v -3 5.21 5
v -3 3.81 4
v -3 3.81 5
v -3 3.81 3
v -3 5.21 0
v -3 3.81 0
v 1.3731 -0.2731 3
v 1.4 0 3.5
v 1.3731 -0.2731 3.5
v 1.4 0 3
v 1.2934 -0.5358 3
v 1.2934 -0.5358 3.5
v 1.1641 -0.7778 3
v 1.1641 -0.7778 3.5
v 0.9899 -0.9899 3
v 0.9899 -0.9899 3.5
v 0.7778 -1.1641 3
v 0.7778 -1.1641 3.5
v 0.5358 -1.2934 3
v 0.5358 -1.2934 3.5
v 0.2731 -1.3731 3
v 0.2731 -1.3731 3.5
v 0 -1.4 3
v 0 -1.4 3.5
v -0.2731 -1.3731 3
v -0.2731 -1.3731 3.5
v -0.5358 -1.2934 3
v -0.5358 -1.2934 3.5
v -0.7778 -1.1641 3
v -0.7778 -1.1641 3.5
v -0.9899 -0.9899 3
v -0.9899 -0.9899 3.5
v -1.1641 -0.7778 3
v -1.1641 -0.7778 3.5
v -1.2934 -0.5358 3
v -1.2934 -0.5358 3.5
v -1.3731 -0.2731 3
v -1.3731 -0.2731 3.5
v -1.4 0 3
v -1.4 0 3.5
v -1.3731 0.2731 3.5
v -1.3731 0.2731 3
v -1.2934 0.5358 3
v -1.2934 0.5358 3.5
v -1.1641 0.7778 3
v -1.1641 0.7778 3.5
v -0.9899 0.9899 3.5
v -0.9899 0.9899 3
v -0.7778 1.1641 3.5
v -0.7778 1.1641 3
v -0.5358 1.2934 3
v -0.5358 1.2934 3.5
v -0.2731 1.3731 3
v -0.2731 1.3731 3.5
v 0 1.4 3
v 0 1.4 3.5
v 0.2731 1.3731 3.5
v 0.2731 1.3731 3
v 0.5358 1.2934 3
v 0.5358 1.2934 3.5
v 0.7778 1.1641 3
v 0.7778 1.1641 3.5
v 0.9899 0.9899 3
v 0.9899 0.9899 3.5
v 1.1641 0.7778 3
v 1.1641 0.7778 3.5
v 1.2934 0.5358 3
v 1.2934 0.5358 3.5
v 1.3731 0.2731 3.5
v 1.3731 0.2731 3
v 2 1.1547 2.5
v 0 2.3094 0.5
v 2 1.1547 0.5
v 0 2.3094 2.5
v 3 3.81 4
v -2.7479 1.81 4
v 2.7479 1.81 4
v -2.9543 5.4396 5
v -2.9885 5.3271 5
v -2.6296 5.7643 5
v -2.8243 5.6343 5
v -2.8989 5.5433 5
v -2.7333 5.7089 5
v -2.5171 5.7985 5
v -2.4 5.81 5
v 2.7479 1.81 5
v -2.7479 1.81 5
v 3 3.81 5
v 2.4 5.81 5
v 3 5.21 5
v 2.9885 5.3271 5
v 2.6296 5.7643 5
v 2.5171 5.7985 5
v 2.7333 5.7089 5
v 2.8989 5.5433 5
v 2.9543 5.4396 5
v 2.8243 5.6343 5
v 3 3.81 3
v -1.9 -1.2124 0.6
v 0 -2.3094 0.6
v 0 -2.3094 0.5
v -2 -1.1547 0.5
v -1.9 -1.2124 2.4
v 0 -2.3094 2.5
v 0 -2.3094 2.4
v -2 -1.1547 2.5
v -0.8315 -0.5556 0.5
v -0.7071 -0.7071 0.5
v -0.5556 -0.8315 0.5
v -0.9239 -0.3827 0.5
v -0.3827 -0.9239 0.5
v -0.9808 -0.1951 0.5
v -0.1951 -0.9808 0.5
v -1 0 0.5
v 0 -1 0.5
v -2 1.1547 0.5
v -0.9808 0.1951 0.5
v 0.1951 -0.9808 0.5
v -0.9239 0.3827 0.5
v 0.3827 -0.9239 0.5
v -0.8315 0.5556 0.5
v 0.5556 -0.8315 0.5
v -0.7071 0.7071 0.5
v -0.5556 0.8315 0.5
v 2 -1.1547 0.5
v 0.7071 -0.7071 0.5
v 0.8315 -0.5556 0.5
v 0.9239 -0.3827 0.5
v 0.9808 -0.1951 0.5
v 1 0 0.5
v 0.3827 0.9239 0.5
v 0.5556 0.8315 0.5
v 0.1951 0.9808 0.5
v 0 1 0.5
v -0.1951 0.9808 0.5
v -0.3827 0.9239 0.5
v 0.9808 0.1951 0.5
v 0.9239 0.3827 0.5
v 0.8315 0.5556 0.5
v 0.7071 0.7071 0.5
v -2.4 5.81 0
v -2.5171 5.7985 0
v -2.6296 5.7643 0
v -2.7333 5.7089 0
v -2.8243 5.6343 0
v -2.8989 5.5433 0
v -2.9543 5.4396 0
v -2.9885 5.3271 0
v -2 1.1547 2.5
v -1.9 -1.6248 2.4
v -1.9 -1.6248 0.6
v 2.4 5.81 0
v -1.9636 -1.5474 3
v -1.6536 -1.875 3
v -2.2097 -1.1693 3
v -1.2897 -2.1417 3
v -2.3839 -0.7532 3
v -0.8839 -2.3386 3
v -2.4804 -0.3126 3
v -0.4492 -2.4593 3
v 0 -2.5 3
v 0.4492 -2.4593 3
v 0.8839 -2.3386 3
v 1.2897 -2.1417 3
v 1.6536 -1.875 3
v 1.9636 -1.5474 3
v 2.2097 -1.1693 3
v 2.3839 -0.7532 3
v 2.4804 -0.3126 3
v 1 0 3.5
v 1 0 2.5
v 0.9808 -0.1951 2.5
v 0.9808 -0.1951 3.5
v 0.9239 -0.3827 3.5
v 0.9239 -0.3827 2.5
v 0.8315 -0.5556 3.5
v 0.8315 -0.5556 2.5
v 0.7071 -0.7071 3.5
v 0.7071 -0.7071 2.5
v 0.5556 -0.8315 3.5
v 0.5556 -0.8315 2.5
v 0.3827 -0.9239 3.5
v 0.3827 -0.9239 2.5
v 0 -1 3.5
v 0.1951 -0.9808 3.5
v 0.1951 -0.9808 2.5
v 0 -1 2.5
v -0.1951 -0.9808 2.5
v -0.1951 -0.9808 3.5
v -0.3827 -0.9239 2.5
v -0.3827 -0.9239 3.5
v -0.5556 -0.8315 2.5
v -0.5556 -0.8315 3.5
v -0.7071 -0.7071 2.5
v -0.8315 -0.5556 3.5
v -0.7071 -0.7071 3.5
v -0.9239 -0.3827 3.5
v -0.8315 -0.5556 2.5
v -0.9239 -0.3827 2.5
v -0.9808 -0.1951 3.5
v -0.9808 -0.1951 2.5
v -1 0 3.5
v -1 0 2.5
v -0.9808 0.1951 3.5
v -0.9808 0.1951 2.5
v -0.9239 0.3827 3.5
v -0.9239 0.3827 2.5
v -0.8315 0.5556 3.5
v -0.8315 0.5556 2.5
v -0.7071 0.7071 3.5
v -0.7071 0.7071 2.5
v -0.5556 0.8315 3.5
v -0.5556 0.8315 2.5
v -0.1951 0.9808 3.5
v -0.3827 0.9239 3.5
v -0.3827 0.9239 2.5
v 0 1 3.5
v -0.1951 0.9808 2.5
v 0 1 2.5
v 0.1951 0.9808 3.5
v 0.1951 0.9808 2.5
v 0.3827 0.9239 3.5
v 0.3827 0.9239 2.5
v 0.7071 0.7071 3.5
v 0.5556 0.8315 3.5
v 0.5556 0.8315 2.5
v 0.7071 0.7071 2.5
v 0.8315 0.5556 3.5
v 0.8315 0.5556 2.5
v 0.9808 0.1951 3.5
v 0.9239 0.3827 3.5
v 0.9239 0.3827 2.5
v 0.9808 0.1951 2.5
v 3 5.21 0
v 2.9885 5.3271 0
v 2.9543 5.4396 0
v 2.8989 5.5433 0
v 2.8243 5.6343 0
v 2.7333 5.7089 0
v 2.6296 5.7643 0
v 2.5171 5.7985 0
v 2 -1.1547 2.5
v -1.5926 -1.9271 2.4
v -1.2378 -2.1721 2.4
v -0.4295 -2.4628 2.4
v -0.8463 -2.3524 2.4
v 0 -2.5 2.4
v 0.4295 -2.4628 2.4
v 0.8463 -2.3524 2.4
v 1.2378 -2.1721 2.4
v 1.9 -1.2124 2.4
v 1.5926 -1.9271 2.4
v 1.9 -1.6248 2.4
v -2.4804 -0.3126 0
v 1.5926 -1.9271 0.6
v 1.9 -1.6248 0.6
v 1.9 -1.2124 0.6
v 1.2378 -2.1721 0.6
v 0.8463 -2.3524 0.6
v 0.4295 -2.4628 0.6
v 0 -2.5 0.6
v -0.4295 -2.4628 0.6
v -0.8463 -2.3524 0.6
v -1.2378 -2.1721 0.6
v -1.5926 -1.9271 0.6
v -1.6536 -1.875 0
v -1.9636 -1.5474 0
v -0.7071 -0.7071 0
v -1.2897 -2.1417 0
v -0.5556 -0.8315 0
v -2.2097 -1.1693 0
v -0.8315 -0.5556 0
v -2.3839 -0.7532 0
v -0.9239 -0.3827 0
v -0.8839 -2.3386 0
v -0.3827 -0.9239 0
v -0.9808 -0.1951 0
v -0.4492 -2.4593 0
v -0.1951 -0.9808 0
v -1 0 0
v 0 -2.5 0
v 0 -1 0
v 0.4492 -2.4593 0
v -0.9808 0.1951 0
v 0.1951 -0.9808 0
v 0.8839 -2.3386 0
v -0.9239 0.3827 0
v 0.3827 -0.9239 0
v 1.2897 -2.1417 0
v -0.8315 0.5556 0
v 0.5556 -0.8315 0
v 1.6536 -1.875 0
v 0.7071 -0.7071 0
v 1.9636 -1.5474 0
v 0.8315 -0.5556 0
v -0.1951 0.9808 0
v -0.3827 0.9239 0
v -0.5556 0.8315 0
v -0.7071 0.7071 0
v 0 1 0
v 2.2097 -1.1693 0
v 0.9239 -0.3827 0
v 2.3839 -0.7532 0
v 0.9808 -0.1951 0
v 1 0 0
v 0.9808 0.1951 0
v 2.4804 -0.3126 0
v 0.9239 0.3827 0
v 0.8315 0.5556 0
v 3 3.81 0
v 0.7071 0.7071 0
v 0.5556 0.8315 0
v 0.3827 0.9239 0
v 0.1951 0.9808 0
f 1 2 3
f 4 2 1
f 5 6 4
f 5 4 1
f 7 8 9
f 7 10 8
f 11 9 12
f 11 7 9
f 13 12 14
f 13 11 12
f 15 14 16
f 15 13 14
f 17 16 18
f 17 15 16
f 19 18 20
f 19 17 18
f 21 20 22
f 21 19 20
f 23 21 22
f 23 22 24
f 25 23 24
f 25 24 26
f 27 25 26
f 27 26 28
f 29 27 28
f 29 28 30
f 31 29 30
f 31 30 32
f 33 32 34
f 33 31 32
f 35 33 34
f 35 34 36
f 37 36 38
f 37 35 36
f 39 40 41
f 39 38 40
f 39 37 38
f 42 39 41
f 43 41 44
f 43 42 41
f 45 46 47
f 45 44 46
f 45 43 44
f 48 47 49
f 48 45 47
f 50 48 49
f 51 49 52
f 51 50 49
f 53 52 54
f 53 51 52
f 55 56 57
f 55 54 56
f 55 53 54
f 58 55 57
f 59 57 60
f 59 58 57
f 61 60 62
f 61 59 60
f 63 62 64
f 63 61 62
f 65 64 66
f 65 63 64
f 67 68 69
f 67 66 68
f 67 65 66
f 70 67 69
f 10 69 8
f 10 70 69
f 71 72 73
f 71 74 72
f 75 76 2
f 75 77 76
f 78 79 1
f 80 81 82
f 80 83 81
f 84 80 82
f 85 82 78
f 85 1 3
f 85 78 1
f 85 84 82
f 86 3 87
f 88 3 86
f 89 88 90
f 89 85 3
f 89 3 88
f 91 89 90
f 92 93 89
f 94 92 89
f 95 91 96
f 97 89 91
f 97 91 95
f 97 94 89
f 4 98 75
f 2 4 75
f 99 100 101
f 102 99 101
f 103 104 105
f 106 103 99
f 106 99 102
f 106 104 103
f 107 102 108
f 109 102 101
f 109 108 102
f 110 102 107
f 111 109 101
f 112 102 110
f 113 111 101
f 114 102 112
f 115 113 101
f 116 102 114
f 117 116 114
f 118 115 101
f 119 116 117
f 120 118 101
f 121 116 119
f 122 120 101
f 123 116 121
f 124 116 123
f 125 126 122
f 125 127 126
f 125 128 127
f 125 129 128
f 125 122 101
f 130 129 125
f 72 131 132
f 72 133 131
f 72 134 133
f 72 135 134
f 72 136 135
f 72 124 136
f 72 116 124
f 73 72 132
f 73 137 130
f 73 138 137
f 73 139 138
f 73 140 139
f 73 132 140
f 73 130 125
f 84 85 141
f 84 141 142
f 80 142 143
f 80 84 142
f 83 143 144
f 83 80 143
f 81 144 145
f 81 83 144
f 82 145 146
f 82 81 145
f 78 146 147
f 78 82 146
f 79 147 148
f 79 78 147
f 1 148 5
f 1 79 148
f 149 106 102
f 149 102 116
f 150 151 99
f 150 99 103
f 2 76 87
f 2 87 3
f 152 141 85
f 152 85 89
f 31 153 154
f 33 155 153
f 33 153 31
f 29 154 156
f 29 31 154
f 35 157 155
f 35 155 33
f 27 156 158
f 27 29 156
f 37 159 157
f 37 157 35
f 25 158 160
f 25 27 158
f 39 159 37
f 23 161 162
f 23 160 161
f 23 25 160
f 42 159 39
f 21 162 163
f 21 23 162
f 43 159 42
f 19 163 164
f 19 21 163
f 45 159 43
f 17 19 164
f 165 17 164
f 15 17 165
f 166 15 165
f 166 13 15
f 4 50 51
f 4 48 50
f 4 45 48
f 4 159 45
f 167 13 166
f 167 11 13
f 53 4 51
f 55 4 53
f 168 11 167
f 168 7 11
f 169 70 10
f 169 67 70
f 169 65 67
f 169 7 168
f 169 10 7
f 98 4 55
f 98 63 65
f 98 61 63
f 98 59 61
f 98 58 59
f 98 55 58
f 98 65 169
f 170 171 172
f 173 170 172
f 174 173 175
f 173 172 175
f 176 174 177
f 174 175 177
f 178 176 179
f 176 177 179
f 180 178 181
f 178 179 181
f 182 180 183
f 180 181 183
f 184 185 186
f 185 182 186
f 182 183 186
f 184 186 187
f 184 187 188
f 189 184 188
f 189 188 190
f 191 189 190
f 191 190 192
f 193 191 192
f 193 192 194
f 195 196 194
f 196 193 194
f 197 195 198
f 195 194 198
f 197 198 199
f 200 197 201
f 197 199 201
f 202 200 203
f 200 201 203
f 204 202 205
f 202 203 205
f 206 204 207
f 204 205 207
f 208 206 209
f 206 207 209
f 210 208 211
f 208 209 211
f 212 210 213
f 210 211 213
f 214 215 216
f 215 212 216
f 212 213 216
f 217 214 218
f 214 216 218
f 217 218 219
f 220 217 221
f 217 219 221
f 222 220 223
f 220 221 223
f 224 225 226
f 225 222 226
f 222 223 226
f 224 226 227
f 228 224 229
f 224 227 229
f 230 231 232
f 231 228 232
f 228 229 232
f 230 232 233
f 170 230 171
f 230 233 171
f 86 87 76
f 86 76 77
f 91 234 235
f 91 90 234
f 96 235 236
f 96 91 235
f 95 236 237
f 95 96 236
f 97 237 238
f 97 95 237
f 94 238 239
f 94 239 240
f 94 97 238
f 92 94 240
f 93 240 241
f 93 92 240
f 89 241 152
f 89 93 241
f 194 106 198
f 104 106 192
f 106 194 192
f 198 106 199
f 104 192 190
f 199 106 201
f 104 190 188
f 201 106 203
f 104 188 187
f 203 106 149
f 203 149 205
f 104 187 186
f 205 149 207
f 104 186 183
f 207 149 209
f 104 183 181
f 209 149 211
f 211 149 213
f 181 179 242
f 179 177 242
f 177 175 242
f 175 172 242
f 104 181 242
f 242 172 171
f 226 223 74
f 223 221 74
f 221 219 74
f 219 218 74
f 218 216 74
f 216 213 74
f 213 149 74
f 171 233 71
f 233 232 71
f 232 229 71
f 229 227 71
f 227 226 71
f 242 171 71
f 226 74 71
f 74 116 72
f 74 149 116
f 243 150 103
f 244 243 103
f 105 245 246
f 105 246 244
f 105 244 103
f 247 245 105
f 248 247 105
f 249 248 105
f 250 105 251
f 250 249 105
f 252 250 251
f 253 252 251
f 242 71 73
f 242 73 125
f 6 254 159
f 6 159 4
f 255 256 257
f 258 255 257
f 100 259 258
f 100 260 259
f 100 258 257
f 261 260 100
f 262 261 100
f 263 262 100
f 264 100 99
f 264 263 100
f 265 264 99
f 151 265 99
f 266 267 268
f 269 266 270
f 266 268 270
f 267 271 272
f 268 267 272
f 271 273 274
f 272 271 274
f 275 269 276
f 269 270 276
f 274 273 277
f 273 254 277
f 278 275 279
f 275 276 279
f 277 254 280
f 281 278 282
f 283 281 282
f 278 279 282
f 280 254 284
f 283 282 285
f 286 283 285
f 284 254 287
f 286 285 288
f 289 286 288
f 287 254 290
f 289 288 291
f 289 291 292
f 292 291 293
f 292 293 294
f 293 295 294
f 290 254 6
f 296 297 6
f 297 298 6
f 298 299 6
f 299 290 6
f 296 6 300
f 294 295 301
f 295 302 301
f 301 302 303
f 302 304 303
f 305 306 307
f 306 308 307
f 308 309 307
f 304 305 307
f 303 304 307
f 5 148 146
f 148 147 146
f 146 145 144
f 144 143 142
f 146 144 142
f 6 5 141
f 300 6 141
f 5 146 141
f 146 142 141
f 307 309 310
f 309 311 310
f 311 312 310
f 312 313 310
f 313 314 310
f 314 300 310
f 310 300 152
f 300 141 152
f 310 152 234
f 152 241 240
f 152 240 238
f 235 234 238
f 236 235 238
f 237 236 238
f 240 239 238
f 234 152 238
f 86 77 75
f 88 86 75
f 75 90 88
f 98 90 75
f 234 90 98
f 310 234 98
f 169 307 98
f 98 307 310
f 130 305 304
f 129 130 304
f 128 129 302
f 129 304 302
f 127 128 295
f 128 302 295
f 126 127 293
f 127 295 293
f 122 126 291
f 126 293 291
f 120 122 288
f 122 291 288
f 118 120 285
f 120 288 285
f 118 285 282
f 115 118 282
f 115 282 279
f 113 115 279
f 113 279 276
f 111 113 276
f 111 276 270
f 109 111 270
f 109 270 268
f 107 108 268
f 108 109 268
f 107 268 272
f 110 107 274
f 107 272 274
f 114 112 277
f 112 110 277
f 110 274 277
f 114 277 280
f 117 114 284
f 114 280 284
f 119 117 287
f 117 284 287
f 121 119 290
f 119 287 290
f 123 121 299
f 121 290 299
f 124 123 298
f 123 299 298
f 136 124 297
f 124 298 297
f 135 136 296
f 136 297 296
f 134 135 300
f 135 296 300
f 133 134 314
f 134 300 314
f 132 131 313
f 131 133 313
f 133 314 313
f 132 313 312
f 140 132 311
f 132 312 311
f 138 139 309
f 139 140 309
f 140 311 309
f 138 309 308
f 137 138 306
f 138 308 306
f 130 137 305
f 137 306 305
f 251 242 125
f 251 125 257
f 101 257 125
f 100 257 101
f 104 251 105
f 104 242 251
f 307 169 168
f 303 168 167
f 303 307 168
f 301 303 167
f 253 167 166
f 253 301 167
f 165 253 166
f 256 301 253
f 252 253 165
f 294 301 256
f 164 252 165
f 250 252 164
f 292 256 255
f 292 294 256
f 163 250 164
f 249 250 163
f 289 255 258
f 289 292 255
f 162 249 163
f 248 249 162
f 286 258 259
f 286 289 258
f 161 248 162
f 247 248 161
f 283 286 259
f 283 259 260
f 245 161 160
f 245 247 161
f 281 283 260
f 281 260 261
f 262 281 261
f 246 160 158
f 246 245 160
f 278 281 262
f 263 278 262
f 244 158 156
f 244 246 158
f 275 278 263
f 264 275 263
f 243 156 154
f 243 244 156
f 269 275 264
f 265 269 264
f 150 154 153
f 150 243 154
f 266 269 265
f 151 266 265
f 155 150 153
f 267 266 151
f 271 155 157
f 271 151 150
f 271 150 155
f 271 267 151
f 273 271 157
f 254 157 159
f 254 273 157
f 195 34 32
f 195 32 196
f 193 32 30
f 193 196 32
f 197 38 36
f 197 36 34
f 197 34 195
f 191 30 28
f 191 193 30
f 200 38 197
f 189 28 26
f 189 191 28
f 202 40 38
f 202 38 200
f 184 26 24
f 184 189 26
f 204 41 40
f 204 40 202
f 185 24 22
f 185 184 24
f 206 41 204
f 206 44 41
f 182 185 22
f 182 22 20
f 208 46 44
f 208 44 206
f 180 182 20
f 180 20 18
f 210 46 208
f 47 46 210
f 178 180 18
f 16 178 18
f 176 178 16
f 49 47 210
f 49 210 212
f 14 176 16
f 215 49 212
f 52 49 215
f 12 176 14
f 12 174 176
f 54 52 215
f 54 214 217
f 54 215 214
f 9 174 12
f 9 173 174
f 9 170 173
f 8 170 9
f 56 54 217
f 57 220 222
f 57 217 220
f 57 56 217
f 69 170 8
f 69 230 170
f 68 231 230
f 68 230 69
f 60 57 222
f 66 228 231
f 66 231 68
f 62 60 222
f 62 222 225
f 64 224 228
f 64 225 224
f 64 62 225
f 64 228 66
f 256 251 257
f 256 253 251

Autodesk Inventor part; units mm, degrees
ref_plane "YZ Plane" through (0, 0, 0) normal (1, 0, 0) x (0, 1, 0)
ref_plane "XZ Plane" through (0, 0, 0) normal (0, 1, 0) x (-1, 0, 0)
sketch "Sketch1" plane through (0, 0, 0) normal (0, 0, 1) x (1, 0, 0)
  circle A0 centre (0, 0) radius 1
  line L0 (-8.2702, 3.81) -> (10.8086, 3.81) construction
  arc A1 (-2.4804, -0.3126) -> (2.4804, -0.3126) centre (0, 0) ccw
  line L1 (0, 0) -> (2.4804, -0.3126) construction
  line L2 (-3, 3.81) -> (-3, 5.81)
  line L3 (-3, 5.81) -> (3, 5.81)
  line L4 (3, 5.81) -> (3, 3.81)
  line L5 (0, 5.81) -> (0, -5.1474) construction
  line L6 (2.4804, -0.3126) -> (3, 3.81)
  line L7 (-2.4804, -0.3126) -> (-3, 3.81)
  dimension "d0" = 2
  dimension "d3" = 3.81
  dimension "d4" = 2
  dimension "d5" = 6
  dimension "d6" = 2.5
extrude "Extrusion1" add sketch "Sketch1" along normal blind 5
sketch "Sketch2" plane through (3, 3.81, 0) normal (1, 0, 0) x (0, 0, -1)
  line L0 (-5, 0) -> (-5, 2) projected
  line L1 (0, 0) -> (-5, 0) projected
  line L2 (-4, 0) -> (-3, 0)
  line L3 (-3, 0) -> (-3, -8)
  line L4 (-3, -8) -> (-4, -8)
  line L5 (-4, -8) -> (-4, 0)
  point P0 (0, -3.81)
  dimension "d7" = 1
  dimension "d9" = 1
  dimension "d10" = 8
extrude "Extrusion2" cut sketch "Sketch2" against normal blind 10
sketch "Sketch3" plane through (0, 0, 3) normal (0, 0, 1) x (1, 0, 0)
  arc A0 (-2.4804, -0.3126) -> (2.4804, -0.3126) centre (0, 0) ccw projected
  line L0 (3, 3.81) -> (-3, 3.81) projected
  circle A1 centre (0, 0) radius 1 projected
  line L1 (0, 2.3094) -> (2, 1.1547)
  line L2 (2, 1.1547) -> (2, -1.1547)
  line L3 (2, -1.1547) -> (0, -2.3094)
  line L4 (0, -2.3094) -> (-2, -1.1547)
  line L5 (-2, -1.1547) -> (-2, 1.1547)
  line L6 (-2, 1.1547) -> (0, 2.3094)
  line L7 (0, 3.81) -> (0, 1.7188) construction
  point P0 (0, 0)
  dimension "d13" = 2
extrude "Extrusion3" cut sketch "Sketch3" against normal blind 2.5
sketch "Sketch5" plane through (0, 0, 3) normal (0, 0, 1) x (1, 0, 0)
  line L0 (-2, 1.1547) -> (0, 2.3094) projected
  line L1 (0, 2.3094) -> (2, 1.1547) projected
  line L2 (2, 1.1547) -> (2, -1.1547) projected
  line L3 (2, -1.1547) -> (0, -2.3094) projected
  line L4 (0, -2.3094) -> (-2, -1.1547) projected
  line L5 (-2, -1.1547) -> (-2, 1.1547) projected
  circle A0 centre (0, 0) radius 1 projected
extrude "Extrusion5" add sketch "Sketch5" against normal blind 0.5
ref_plane "Work Plane1" through (-3, -2.69, 0) normal (0, 1, 0) x (1, 0, 0)
sketch "Sketch6" plane through (-3, -2.69, 0) normal (0, 1, 0) x (1, 0, 0)
  line L0 (1, -2.5) -> (3, -2.5) projected
  line L1 (3, -2.5) -> (3, -0.5) projected
  line L2 (1, -2.5) -> (1, -0.5) projected
  line L3 (3, -2.5) -> (5, -2.5) projected
  line L4 (5, -2.5) -> (5, -0.5) projected
  line L5 (3, -2.5) -> (3, -0.5) projected
  line L6 (4.9, -0.6) -> (1.1, -0.6)
  line L7 (1.1, -0.6) -> (1.1, -2.4)
  line L8 (1.1, -2.4) -> (4.9, -2.4)
  line L9 (4.9, -2.4) -> (4.9, -0.6)
  line L10 (5, -0.5) -> (3, -0.5) projected
  line L11 (3, -0.5) -> (1, -0.5) projected
  point P0 (3, 0)
  dimension "d28" = 0.1
  dimension "d29" = 0.1
  dimension "d30" = 0.1
extrude "Extrusion6" cut sketch "Sketch6" along normal blind 2 and the other way blind 2 contours L8 L7 L6 L1 | L1 L6 L9 L8
sketch "Sketch7" plane through (0, 0, 5) normal (0, 0, 1) x (1, 0, 0)
  circle A0 centre (0, 0) radius 1 projected
  arc A1 (-2.4804, -0.3126) -> (2.4804, -0.3126) centre (0, 0) ccw projected
  line L0 (2.4804, -0.3126) -> (3, 3.81) projected
  line L1 (3, 3.81) -> (3, 5.21) projected
  line L2 (2.4, 5.81) -> (-2.4, 5.81) projected
  line L3 (-3, 5.21) -> (-3, 3.81) projected
  line L4 (-3, 3.81) -> (-2.4804, -0.3126) projected
  line L5 (-3, 3.81) -> (3, 3.81)
  arc A2 (-2.4, 5.81) -> (-3, 5.21) centre (-2.4, 5.21) ccw projected
  arc A3 (3, 5.21) -> (2.4, 5.81) centre (2.4, 5.21) ccw projected
  line L6 (2.4804, -0.3126) -> (3, 3.81) projected
  line L7 (-3, 5.81) -> (-3, 3.81) projected
  line L8 (-3, 3.81) -> (-2.4804, -0.3126) projected
  line L9 (-2.7479, 1.81) -> (2.7479, 1.81)
  dimension "d35" = 2
fillet "Fillet1" radius 0.6 2 edges at (3, 5.81, 2.5) (-3, 5.81, 2.5)
extrude "Extrusion7" cut sketch "Sketch7" against normal blind 2 contours L4 L9 L0 A1
sketch "Sketch8" plane through (0, 0, 3) normal (0, 0, 1) x (1, 0, 0)
  circle A0 centre (0, 0) radius 1 projected
  arc A1 (-2.4804, -0.3126) -> (2.4804, -0.3126) centre (0, 0) ccw projected
  circle A2 centre (0, 0) radius 1.4
  circle A3 centre (0, 0) radius 1
  dimension "d36" = 2.8
  dimension "d37" = 2
extrude "Extrusion8" add sketch "Sketch8" along normal blind 0.5
properties part number "HexSaver01"
